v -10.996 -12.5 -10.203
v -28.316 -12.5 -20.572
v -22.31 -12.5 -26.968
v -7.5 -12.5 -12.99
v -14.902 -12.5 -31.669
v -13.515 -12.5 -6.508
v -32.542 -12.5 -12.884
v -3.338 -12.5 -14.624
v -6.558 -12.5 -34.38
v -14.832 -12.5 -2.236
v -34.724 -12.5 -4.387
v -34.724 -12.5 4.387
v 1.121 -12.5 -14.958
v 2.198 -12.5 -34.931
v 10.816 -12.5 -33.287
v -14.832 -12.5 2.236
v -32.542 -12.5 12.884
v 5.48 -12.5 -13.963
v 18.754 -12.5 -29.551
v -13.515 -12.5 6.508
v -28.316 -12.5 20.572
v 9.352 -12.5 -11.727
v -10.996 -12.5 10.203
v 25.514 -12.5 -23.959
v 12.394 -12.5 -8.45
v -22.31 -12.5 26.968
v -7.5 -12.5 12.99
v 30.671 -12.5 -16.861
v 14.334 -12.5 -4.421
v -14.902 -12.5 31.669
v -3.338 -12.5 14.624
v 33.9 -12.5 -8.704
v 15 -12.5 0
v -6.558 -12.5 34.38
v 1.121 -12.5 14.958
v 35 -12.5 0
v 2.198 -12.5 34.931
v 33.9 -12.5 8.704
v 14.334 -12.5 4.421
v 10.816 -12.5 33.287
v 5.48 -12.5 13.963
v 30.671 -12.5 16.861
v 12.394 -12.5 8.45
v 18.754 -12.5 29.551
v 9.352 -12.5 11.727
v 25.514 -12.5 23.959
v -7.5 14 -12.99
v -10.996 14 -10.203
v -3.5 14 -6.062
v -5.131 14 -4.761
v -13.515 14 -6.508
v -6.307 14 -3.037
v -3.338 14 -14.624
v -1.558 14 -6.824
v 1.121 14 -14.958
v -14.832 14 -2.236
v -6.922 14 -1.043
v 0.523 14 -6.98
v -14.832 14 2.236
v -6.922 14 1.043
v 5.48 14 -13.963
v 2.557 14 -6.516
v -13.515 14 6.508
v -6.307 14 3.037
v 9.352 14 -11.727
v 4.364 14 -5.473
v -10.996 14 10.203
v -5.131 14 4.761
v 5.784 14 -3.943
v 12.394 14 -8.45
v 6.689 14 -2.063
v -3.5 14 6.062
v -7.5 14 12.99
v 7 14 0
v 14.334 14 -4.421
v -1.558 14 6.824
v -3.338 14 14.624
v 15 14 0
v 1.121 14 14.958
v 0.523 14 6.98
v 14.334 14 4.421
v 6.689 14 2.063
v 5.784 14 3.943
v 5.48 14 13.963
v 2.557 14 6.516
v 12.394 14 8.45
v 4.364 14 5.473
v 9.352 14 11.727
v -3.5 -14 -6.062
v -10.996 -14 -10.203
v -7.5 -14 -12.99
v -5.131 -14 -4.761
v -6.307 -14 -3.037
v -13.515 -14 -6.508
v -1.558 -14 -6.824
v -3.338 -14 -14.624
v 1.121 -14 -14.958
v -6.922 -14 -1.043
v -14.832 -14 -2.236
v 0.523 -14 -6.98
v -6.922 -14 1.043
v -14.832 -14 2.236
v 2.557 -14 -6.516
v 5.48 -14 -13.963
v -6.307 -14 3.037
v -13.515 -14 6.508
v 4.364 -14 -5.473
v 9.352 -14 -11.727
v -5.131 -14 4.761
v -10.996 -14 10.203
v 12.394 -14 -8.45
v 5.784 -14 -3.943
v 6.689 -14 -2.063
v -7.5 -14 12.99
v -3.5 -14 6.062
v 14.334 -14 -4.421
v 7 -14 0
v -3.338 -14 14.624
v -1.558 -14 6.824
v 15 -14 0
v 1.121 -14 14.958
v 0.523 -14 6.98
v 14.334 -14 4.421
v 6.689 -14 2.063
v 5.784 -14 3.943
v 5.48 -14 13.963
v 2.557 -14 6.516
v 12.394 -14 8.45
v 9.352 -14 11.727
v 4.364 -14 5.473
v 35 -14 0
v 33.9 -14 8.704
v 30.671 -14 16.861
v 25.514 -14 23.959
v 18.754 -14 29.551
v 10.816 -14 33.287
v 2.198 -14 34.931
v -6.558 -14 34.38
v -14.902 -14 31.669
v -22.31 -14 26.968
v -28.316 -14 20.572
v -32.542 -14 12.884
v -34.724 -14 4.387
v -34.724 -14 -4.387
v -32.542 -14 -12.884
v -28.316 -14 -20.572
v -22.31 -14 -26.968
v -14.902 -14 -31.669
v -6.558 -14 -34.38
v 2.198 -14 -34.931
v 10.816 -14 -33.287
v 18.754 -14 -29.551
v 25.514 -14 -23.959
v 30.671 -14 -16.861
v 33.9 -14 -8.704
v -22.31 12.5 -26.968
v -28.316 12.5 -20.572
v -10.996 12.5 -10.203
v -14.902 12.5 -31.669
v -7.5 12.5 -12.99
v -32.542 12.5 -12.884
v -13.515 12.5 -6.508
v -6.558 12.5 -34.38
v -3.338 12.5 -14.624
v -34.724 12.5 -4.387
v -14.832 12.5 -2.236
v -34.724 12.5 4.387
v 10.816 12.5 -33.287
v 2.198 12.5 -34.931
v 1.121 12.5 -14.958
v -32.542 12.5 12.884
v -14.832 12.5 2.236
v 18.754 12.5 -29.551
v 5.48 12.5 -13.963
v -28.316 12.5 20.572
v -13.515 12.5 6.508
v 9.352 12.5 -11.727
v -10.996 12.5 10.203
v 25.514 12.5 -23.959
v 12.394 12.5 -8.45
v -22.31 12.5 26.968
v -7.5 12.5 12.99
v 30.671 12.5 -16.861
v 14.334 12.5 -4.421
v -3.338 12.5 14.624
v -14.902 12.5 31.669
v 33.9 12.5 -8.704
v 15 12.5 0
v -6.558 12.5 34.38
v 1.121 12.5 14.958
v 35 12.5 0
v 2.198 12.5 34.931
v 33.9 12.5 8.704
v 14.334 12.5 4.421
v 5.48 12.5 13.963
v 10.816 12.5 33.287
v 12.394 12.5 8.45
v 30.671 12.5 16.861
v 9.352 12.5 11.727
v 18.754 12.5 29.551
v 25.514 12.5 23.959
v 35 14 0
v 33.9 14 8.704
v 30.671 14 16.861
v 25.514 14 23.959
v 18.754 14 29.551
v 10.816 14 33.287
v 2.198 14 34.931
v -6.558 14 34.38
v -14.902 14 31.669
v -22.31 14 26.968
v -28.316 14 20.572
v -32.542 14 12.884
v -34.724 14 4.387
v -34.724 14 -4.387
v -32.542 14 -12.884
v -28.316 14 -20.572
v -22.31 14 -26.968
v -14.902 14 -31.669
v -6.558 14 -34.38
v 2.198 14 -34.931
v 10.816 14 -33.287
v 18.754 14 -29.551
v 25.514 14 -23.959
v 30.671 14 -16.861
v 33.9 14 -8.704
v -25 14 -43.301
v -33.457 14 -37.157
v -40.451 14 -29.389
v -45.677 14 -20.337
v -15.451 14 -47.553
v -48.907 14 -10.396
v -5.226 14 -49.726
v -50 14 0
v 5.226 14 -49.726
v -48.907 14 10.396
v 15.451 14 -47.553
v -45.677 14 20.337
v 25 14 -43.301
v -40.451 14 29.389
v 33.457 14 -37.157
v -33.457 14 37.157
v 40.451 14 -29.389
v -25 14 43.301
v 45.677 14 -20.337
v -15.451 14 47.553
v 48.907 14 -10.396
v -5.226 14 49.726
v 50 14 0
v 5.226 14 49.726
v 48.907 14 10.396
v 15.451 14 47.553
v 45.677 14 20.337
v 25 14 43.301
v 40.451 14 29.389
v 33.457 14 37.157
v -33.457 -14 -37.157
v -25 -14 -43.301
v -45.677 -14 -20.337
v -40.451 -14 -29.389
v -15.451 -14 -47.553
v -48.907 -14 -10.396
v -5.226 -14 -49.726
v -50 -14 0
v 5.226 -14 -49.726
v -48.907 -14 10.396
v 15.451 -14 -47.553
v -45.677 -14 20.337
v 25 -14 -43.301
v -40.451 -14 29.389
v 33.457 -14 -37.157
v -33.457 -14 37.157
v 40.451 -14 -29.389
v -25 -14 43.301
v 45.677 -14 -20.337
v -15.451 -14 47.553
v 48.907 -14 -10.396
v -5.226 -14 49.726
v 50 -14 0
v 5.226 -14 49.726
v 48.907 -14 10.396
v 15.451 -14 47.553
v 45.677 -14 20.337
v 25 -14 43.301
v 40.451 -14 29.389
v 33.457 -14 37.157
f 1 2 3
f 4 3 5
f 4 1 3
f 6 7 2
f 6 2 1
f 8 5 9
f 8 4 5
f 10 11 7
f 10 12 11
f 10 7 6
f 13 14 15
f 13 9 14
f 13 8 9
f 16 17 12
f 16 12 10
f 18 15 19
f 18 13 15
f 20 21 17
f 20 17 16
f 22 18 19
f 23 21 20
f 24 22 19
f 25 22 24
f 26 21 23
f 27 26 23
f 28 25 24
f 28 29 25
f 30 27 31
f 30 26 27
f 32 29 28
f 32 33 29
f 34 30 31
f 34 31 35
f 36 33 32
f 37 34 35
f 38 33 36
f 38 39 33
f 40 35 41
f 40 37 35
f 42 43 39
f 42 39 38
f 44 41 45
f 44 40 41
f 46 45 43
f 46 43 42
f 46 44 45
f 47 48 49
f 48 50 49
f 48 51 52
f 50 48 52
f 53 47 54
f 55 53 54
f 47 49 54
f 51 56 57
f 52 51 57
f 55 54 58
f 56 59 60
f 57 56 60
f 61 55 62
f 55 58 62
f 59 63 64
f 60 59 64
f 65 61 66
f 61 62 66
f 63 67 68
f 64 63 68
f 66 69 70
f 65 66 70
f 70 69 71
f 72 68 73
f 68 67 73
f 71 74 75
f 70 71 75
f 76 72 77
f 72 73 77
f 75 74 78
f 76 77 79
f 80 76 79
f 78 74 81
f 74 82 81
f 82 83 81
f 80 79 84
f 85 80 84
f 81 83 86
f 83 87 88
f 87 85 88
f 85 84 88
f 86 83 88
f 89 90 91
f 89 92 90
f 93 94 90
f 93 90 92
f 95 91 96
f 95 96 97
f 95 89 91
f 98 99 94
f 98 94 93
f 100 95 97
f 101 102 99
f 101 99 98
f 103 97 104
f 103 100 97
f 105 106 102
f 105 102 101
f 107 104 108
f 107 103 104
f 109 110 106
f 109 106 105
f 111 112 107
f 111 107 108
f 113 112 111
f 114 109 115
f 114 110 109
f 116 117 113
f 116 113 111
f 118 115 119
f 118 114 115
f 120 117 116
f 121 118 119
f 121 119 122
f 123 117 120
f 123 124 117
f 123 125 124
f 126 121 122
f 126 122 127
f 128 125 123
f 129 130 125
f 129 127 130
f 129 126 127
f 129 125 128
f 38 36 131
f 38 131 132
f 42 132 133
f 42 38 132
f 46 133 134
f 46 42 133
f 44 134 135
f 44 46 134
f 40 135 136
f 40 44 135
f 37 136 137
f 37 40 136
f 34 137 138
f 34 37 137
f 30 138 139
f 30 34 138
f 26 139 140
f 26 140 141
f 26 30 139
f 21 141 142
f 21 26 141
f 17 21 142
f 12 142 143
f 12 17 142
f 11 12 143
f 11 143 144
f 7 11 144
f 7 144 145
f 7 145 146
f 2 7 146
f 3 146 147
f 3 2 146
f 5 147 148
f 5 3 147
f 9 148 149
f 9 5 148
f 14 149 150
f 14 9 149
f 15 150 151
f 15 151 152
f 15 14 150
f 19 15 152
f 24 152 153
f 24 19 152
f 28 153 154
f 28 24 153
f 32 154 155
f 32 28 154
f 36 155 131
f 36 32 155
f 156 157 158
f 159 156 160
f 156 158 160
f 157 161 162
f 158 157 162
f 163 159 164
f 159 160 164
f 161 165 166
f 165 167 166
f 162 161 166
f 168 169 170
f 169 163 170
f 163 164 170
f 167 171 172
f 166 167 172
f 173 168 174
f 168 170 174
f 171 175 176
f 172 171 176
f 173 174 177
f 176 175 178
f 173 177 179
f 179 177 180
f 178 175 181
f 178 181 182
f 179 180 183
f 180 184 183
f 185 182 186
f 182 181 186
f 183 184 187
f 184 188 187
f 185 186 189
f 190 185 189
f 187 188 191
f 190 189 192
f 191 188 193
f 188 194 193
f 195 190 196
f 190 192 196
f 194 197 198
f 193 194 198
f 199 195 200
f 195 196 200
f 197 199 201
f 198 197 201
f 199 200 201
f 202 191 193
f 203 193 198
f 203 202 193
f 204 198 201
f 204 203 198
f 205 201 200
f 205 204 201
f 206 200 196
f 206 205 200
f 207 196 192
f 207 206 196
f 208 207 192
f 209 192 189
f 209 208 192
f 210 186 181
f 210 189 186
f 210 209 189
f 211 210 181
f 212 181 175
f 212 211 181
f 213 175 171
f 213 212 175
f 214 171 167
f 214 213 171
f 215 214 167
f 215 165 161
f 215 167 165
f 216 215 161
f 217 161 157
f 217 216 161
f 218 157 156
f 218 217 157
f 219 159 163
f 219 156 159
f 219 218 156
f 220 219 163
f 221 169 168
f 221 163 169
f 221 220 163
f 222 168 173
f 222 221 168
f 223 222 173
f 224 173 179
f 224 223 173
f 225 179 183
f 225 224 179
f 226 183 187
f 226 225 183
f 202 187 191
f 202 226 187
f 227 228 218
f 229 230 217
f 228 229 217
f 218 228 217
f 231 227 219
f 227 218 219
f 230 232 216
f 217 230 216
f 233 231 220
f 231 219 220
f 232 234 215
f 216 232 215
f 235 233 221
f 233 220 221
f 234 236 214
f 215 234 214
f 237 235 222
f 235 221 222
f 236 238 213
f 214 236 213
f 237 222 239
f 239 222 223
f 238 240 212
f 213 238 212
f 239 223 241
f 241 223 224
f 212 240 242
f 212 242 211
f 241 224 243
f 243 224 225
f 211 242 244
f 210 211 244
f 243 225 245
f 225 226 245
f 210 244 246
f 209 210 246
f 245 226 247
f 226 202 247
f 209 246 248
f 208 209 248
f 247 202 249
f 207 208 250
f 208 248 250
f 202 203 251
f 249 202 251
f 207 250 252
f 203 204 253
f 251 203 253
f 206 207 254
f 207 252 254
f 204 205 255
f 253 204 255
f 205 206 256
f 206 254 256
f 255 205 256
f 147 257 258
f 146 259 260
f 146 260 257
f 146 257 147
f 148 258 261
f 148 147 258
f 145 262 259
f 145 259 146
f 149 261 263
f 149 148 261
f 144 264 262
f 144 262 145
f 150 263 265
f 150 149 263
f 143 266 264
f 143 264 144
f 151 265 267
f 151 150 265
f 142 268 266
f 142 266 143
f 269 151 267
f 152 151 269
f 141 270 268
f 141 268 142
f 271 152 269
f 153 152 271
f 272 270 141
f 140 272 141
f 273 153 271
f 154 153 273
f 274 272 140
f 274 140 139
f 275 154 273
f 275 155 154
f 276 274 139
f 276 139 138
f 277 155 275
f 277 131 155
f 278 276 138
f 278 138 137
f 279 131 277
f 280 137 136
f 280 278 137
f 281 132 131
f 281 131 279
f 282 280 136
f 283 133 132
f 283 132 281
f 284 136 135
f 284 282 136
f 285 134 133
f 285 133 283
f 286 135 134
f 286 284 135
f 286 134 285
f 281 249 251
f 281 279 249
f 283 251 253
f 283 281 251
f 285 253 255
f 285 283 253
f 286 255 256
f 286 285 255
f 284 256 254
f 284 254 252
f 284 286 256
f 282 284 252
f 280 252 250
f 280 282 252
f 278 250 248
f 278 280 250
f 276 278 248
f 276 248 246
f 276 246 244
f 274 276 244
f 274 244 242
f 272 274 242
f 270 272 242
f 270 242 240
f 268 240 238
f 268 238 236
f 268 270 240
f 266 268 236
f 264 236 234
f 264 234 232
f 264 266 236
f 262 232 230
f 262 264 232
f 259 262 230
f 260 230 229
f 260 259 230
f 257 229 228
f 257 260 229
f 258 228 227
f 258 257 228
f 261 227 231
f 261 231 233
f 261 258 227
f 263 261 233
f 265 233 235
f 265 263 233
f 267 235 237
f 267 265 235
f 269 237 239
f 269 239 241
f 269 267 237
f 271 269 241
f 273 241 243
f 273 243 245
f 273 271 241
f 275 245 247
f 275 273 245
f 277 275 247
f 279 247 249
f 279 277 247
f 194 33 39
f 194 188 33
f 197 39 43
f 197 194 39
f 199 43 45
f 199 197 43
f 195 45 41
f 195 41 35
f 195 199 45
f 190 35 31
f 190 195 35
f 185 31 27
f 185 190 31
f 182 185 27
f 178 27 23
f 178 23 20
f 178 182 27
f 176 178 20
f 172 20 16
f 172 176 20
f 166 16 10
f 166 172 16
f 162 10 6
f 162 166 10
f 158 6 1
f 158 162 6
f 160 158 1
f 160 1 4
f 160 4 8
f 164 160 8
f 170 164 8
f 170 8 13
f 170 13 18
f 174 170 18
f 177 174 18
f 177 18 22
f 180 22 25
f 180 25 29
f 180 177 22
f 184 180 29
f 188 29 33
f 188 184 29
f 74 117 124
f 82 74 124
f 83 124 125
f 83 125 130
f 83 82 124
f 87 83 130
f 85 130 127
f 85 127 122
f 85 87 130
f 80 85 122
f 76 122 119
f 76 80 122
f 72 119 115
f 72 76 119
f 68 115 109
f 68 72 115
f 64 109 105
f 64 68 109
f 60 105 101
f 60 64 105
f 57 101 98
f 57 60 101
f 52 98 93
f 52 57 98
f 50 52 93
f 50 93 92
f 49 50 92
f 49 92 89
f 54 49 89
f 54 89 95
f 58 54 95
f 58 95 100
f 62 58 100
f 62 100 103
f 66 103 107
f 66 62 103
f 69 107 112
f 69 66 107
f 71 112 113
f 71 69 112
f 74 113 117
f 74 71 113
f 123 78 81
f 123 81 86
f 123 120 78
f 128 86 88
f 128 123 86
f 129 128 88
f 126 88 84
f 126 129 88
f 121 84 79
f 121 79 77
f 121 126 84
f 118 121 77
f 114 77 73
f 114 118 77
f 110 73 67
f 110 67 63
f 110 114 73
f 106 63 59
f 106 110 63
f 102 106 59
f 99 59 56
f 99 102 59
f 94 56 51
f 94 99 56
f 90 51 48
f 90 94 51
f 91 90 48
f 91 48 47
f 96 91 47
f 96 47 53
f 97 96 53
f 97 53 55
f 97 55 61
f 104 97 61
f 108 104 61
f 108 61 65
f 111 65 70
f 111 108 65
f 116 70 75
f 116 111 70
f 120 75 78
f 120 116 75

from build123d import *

# Parameters (mm, degrees)
F0_R     = 15
F0_R_2   = 7
F1_DEPTH = 14
F0_R_3   = 50
F0_R_4   = 35
F2_DEPTH = 12.5


with BuildPart() as f1:
    # F0 (on Front) → F1 (new body, symmetric)
    with BuildSketch(Plane.XZ):
        Circle(F0_R)
        Circle(F0_R_2, mode=Mode.SUBTRACT)
    extrude(amount=F1_DEPTH, both=True)


with BuildPart() as f1b:
    # F0 (on Front) → F1, piece 2 (new body, symmetric)
    with BuildSketch(Plane.XZ):
        Circle(F0_R_3)
        Circle(F0_R_4, mode=Mode.SUBTRACT)
    extrude(amount=F1_DEPTH, both=True)

    # F0 (on Front) → F2 (join, symmetric)
    with BuildSketch(Plane.XZ):
        Circle(F0_R_3)
        Circle(F0_R_4, mode=Mode.SUBTRACT)
        Circle(F0_R_4)
        Circle(F0_R, mode=Mode.SUBTRACT)
    extrude(amount=F2_DEPTH, both=True)


solid = Compound([f1.part, f1b.part])
